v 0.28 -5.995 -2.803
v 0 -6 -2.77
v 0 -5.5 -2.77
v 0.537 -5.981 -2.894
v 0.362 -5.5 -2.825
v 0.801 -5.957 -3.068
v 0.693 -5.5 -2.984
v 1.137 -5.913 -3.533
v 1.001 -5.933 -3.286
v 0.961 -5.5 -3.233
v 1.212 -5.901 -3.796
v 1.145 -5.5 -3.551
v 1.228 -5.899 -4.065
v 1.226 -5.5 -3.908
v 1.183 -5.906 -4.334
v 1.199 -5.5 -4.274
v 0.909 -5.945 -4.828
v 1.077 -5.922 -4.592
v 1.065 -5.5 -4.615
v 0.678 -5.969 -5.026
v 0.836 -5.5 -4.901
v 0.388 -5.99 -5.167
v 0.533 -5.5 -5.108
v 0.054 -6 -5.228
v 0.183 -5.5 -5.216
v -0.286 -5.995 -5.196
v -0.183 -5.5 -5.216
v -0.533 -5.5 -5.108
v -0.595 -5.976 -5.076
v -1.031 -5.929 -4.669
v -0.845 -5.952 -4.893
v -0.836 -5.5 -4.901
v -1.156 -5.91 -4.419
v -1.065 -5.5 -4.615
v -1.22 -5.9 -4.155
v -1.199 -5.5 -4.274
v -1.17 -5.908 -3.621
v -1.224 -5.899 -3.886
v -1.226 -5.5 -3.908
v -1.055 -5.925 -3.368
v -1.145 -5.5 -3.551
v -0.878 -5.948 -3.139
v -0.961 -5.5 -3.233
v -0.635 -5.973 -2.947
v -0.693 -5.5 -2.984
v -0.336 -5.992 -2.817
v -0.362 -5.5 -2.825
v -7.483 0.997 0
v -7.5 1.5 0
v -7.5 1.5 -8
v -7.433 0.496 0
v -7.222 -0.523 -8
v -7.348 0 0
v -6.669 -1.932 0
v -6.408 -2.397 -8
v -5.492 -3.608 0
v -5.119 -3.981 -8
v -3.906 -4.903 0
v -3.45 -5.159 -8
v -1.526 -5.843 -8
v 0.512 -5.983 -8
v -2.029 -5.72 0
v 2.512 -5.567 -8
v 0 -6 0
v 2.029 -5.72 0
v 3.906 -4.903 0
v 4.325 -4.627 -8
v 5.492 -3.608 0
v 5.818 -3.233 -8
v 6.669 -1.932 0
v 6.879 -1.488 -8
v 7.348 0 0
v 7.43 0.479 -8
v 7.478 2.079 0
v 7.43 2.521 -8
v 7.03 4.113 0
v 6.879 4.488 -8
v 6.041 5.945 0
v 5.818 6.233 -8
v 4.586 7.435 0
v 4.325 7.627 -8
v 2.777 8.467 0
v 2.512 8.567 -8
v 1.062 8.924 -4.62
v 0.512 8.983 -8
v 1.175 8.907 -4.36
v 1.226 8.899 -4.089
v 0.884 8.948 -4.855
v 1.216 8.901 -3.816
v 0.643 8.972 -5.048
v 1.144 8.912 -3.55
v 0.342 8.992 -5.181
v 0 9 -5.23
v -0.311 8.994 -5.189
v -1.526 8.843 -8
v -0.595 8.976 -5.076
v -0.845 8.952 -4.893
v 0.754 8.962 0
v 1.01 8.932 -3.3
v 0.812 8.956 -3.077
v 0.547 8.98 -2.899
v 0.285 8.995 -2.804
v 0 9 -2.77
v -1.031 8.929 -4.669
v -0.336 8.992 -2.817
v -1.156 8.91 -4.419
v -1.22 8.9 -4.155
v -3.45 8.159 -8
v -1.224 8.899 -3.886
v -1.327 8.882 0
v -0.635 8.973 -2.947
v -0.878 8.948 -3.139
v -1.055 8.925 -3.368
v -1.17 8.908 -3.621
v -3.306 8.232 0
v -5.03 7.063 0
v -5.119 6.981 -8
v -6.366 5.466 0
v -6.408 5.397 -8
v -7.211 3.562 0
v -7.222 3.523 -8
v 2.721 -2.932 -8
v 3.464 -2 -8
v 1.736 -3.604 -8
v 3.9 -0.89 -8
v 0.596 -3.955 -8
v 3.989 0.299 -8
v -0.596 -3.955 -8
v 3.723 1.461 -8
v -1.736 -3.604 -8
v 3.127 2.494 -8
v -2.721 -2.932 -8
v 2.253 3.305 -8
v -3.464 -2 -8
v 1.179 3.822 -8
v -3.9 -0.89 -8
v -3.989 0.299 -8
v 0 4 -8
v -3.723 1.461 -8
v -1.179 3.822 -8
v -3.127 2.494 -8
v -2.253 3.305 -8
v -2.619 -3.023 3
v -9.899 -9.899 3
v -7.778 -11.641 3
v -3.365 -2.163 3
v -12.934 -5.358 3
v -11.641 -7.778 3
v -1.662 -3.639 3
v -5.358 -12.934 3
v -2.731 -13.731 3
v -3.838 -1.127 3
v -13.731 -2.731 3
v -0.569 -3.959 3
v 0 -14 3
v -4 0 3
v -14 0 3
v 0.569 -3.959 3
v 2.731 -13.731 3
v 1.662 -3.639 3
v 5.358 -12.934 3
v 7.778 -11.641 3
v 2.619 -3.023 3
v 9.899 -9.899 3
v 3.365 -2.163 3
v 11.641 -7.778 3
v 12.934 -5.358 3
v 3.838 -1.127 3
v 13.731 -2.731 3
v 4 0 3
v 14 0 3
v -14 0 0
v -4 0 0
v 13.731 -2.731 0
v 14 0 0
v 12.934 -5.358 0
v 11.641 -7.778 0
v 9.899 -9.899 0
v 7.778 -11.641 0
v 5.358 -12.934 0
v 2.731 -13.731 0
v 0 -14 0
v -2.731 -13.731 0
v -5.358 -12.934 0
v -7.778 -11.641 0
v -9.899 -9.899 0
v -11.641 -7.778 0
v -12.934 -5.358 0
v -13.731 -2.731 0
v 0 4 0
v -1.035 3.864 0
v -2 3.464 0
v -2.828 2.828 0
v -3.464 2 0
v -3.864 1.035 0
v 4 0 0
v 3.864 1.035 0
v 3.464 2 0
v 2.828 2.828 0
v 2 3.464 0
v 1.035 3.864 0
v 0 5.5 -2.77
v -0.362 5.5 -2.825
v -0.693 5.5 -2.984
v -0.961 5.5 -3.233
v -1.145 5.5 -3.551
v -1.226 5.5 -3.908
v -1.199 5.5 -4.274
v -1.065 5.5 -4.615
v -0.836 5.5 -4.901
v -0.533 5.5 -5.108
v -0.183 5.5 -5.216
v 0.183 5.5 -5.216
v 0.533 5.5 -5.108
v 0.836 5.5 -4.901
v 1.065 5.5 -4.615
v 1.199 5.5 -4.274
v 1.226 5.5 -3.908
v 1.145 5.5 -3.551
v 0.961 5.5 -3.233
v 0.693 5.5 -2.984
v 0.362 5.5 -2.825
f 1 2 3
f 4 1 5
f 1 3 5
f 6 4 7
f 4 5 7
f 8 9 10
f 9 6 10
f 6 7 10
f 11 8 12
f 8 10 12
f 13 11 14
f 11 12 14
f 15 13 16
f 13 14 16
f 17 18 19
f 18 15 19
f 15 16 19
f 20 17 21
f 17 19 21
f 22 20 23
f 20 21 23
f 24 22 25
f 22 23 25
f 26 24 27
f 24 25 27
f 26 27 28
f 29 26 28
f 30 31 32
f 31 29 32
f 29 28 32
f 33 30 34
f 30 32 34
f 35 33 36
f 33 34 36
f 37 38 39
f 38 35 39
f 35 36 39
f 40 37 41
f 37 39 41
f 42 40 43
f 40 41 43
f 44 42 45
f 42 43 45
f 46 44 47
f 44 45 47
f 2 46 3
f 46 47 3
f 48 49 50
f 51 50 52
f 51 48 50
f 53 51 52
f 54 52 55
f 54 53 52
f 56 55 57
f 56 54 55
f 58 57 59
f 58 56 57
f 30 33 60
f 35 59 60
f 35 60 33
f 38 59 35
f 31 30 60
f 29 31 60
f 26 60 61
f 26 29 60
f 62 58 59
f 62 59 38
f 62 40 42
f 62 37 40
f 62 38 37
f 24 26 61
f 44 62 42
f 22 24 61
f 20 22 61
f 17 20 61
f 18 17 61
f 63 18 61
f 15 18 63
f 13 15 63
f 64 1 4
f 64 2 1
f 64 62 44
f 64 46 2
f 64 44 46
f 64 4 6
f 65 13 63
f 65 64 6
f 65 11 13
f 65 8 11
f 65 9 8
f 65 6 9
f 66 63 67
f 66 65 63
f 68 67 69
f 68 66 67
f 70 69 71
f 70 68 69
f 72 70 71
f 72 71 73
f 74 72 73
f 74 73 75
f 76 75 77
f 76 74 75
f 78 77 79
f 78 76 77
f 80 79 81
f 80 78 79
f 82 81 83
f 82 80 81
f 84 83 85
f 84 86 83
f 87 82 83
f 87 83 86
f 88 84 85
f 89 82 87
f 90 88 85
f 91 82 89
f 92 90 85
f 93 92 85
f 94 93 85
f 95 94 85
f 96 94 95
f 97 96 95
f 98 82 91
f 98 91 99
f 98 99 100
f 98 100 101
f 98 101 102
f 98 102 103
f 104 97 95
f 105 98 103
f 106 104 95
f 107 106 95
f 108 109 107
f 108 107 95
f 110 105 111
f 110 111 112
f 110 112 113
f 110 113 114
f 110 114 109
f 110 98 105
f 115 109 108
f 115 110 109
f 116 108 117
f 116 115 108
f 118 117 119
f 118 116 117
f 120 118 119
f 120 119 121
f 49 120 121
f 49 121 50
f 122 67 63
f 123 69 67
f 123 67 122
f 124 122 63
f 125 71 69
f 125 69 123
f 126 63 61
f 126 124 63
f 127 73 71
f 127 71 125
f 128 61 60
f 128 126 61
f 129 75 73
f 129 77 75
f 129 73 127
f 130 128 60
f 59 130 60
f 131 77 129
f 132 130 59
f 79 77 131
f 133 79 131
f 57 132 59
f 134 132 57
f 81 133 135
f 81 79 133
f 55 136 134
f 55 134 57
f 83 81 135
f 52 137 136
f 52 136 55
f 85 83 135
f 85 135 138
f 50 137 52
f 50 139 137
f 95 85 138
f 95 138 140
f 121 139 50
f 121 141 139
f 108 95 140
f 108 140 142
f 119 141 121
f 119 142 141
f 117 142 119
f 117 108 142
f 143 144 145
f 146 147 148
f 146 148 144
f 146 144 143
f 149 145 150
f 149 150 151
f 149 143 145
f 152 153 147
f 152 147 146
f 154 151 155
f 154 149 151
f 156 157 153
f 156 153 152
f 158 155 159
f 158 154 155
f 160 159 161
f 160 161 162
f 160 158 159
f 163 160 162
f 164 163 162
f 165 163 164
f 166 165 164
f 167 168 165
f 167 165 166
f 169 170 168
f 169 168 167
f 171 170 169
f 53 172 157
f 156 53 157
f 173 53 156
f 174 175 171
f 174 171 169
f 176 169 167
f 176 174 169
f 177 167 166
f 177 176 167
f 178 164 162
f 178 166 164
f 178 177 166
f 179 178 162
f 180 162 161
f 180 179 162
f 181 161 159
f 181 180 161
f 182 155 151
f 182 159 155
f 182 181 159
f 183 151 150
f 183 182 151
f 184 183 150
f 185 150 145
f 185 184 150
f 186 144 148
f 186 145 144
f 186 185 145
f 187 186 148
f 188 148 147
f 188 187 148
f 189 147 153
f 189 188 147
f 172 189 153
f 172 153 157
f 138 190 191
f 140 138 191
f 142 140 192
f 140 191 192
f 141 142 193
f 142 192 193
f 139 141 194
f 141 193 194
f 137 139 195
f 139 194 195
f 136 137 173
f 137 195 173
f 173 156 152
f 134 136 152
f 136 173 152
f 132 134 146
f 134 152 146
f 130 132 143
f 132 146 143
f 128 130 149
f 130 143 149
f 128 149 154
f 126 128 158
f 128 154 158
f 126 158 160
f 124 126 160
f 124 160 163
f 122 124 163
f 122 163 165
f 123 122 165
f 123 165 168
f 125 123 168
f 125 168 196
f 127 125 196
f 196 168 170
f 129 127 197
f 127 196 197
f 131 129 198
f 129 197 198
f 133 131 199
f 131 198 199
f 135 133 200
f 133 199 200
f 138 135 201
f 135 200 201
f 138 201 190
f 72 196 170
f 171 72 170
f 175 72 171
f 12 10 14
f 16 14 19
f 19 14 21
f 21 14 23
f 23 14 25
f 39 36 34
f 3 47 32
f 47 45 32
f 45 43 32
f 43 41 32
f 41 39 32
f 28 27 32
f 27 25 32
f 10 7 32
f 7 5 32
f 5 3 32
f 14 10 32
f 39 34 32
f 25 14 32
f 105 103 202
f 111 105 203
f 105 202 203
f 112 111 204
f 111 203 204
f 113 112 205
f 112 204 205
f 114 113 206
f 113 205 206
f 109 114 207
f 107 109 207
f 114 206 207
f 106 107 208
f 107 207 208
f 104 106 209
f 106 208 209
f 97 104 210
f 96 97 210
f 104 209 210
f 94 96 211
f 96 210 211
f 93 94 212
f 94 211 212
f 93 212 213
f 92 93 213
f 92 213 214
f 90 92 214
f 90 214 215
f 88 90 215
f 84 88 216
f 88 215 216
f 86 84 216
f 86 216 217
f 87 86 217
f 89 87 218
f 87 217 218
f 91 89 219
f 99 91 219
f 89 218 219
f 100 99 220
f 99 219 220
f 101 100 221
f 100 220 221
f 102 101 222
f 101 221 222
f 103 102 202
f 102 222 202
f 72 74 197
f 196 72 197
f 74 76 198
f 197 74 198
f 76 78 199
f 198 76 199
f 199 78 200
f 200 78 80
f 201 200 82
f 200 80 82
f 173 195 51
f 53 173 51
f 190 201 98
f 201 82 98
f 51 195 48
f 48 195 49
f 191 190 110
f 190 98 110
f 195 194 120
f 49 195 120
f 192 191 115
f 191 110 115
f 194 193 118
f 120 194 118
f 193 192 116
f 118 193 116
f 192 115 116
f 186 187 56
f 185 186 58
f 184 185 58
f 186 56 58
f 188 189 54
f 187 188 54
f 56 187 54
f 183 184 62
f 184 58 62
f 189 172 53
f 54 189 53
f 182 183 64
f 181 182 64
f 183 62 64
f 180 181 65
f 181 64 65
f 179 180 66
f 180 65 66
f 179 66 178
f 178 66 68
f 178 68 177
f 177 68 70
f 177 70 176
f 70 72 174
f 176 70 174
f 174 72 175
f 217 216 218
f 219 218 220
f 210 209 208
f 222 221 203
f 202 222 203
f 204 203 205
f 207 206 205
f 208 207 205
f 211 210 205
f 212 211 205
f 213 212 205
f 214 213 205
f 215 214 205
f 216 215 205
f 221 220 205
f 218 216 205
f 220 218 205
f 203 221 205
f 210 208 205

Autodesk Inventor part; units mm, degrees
ref_plane "YZ Plane" through (0, 0, 0) normal (1, 0, 0) x (0, 1, 0)
sketch "Sketch1" plane through (0, 0, 0) normal (0, 0, 1) x (1, 0, 0)
  arc A0 (-14, 0) -> (14, 0) centre (0, 0) ccw
  line L0 (-14, 0) -> (14, 0)
  dimension "d0" = 28
extrude "Extrusion1" add sketch "Sketch1" along normal blind 3
sketch "Sketch2" plane through (0, 0, 0) normal (0, 0, -1) x (-1, 0, 0)
  circle A0 centre (0, 1.5) radius 7.5
  line L0 (-14, 0) -> (14, 0) projected
  point P0 (0, 0)
  point P1 (0, 0)
  dimension "d22" = 15
  dimension "d23" = 1.5
extrude "Extrusion2" add sketch "Sketch2" along normal blind 8
sketch "Sketch3" plane through (0, 0, -8) normal (0, 0, -1) x (-1, 0, 0)
  circle A0 centre (0, 1.5) radius 7.5 projected
  point P0 (0, 0)
  point P1 (0, 0)
  point P2 (0, 0)
hole "Hole1" at (0, 0, -8) direction (0, 0, 1) diameter 8 depth 11
ref_plane "Work Plane1" through (0, 9, 0) normal (0, 1, 0) x (-1, 0, 0)
sketch "Sketch4" plane through (0, 9, 0) normal (0, 1, 0) x (-1, 0, 0)
  line L0 (-7.5, -8) -> (7.5, -8) projected
  line L1 (7.3485, 0) -> (-7.3485, 0) projected
  line L2 (7.3485, 0) -> (-7.3485, 0) projected
  line L3 (7.5, 0) -> (7.5, -8) projected
  line L4 (-7.5, 0) -> (-7.5, -8) projected
  point P0 (0, 0)
  point P1 (0, -4)
  point P2 (0, 0)
  point P3 (-7.5, -4)
hole "Hole2" at (0, 9, -4) direction (0, -1, 0) diameter 2.459 depth 3.5 thread size "M3x0.5" class "6H" standard "ISO Metric profile"
ref_plane "Work Plane2" through (0, 0, 0) normal (0, 1, 0) x (-1, 0, 0)
mirror "Mirror1" about plane through (0, 0, 0) normal (0, 1, 0) of "Hole2"
properties part number "204"
